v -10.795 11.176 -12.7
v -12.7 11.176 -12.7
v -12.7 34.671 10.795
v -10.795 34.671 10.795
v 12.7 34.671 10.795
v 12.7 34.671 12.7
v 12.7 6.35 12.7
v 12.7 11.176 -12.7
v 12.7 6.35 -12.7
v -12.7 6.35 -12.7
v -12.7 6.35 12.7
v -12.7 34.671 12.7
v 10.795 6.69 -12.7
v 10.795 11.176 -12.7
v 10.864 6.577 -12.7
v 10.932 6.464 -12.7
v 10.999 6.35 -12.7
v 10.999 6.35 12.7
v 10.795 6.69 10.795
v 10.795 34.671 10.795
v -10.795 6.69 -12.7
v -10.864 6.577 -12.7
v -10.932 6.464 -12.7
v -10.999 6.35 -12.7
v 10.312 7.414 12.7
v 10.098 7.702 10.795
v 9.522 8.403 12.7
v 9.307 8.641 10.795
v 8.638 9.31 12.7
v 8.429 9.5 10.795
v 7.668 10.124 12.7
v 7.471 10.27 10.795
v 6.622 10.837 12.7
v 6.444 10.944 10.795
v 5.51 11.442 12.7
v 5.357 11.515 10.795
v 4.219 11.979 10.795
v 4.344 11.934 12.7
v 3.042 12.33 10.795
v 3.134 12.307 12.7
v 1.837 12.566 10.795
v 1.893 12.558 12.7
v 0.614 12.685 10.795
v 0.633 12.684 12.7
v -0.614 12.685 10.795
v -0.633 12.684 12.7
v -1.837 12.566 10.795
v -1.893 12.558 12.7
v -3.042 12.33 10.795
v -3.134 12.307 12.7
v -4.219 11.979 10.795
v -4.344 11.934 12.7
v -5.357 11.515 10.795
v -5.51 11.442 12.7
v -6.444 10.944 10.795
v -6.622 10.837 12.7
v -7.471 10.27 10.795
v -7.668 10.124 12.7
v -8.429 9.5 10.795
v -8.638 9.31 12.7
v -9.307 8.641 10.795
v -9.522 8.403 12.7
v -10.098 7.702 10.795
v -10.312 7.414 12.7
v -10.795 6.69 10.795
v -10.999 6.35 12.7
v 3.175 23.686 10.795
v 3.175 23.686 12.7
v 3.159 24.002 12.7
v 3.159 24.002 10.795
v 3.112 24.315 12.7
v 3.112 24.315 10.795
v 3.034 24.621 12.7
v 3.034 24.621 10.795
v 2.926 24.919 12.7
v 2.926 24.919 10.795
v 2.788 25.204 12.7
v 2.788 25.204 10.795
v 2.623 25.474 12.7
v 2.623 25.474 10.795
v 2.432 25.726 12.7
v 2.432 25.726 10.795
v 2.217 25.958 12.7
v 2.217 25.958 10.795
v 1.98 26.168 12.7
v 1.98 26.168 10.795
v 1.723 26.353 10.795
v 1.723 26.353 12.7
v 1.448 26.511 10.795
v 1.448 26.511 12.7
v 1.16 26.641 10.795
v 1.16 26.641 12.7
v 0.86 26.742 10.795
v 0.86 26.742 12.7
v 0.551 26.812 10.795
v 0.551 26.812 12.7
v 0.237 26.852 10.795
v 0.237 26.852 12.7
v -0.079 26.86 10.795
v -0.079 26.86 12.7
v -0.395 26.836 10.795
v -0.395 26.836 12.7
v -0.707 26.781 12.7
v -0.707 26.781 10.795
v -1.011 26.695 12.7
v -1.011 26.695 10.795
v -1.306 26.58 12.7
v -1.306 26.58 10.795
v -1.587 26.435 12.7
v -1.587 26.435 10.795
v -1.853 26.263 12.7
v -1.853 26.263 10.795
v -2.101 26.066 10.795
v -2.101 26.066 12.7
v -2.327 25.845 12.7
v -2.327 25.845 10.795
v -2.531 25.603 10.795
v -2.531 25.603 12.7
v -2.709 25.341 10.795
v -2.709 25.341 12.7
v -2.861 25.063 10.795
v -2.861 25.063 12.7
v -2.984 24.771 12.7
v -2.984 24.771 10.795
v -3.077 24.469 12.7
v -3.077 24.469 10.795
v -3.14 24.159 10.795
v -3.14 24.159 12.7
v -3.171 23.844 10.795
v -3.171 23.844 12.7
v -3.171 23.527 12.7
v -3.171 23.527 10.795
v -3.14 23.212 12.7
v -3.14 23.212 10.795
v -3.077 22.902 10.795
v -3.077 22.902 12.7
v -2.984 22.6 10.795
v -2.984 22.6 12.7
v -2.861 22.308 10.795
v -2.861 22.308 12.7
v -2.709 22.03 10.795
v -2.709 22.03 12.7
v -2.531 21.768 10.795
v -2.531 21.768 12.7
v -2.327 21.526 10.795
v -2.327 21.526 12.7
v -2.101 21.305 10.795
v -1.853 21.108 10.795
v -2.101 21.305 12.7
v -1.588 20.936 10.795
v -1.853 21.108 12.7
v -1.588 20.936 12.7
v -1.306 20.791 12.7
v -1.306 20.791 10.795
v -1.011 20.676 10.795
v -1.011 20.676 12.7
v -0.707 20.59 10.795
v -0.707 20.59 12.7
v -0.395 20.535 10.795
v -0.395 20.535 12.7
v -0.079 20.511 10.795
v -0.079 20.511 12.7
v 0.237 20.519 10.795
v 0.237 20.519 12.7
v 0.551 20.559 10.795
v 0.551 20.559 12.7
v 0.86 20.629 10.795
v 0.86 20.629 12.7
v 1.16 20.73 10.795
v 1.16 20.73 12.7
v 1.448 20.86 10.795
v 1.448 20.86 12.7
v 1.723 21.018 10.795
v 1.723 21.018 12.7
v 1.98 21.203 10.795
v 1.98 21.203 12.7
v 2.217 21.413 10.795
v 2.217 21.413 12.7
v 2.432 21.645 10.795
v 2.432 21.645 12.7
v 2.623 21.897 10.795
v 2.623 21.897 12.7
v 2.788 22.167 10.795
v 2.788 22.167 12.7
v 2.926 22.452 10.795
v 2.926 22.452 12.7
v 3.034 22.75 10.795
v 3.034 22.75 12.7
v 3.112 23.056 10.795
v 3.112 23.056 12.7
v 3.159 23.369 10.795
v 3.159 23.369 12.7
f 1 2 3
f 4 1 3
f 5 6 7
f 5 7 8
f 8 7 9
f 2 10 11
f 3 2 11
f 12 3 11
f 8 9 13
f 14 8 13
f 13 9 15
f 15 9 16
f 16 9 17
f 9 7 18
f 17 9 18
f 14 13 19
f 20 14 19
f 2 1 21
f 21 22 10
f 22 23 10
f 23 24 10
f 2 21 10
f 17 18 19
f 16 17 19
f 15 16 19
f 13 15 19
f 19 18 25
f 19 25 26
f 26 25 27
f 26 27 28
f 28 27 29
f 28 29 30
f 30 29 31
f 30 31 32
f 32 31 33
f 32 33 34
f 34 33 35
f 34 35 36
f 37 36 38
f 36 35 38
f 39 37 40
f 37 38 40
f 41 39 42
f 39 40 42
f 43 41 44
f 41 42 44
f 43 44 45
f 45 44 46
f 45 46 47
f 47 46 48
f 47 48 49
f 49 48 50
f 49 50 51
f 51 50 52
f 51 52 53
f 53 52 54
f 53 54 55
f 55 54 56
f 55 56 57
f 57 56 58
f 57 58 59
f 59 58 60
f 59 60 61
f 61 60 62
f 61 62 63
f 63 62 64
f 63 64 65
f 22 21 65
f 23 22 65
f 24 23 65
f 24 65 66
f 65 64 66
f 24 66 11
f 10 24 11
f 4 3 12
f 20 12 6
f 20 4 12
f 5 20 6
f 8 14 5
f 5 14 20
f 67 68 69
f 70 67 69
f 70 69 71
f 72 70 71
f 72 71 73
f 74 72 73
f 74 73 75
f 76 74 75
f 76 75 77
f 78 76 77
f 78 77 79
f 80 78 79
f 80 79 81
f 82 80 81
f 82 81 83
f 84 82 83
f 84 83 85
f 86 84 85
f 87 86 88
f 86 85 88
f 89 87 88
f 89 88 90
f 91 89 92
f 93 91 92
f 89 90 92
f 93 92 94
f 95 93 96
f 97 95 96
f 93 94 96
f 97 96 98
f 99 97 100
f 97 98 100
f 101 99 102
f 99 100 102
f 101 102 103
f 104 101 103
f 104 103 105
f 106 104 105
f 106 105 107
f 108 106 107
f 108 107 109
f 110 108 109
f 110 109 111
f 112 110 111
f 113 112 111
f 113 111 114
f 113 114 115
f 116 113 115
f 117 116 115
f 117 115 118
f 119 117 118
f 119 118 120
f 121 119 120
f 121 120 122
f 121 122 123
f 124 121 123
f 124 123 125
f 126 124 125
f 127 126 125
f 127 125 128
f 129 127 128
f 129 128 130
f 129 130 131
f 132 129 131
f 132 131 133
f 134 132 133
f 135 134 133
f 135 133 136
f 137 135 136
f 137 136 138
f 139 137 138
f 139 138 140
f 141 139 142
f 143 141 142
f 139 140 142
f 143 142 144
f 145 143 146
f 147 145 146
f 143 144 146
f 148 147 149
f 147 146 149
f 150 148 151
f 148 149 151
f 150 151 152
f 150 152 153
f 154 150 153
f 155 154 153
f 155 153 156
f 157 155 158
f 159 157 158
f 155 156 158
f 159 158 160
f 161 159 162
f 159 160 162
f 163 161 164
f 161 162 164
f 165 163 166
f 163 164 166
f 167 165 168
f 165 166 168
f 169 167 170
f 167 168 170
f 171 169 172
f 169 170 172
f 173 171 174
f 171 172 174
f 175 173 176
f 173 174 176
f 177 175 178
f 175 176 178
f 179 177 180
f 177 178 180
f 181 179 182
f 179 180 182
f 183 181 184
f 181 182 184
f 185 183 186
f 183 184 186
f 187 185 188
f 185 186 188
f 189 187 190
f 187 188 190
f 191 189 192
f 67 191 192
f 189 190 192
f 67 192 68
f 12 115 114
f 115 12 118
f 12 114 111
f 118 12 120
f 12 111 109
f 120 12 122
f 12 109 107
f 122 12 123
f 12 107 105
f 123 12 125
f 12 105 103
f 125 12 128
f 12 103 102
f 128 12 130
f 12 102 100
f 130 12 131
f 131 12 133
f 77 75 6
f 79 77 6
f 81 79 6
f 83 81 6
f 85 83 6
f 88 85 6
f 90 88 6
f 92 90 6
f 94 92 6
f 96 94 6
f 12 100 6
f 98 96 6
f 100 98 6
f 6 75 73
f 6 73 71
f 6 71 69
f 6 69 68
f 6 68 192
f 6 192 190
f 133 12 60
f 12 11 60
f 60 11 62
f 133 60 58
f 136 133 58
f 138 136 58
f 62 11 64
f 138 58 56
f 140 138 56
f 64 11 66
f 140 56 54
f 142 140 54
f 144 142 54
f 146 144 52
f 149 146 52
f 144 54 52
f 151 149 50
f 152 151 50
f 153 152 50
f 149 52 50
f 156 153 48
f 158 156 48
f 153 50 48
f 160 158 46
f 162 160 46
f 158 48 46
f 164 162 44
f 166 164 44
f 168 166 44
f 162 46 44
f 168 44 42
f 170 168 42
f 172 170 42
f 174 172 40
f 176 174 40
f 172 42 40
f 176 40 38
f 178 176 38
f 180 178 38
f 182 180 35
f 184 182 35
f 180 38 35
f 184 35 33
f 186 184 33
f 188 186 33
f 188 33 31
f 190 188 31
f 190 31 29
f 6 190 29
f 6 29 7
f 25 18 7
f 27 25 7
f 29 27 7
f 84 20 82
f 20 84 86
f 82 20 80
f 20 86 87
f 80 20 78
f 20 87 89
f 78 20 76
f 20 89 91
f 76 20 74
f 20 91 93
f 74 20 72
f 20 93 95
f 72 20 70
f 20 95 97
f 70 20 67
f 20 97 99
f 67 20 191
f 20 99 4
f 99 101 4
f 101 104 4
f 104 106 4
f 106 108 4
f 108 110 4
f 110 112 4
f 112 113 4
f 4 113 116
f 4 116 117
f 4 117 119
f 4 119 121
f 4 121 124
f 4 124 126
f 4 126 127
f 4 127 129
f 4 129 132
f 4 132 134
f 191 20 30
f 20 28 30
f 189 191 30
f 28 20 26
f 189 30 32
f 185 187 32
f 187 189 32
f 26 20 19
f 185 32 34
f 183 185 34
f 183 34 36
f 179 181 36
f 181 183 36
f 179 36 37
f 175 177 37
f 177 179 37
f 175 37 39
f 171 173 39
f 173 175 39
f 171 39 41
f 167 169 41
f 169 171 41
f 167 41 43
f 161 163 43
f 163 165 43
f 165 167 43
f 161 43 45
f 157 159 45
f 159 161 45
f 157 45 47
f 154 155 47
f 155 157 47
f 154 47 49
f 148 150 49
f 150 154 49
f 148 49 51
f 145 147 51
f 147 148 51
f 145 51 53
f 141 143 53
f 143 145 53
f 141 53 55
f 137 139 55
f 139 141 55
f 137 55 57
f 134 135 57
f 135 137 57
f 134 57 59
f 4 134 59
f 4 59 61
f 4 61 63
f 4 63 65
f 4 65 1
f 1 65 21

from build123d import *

# Parameters (mm, degrees)
BOSS_EXTRUDE1_DEPTH = 34.671
CUT_EXTRUDE1_DEPTH  = 45.816606755
SKETCH3_R           = 3.175
CUT_EXTRUDE2_DEPTH  = 45.816606755
CUT_EXTRUDE3_DEPTH  = 45.816606755


with BuildPart() as part:
    # Sketch1 → Boss-Extrude1 (new body)
    with BuildSketch(Plane(origin=(0, 0, 0), x_dir=(1, 0, 0), z_dir=(0, 1, 0))):
        Polygon((-12.7, 12.7), (-12.7, -12.7), (12.7, -12.7), (12.7, 12.7), (10.795, 12.7), (10.795, -10.795), (-10.795, -10.795), (-10.795, 12.7), align=None)
    extrude(amount=BOSS_EXTRUDE1_DEPTH)

    # Sketch2 → Cut-Extrude1 (cut, through all)
    with BuildSketch(Plane.ZY.offset(12.7)):
        Polygon((-12.7, 11.176), (10.795, 34.671), (-12.7, 34.671), align=None)
    extrude(amount=-CUT_EXTRUDE1_DEPTH, mode=Mode.SUBTRACT)

    # Sketch3 → Cut-Extrude2 (cut, through all)
    with BuildSketch(Plane.XY.offset(12.7)):
        with Locations((0, 23.6855)):
            Circle(SKETCH3_R)
    extrude(amount=-CUT_EXTRUDE2_DEPTH, mode=Mode.SUBTRACT)

    # Sketch4 → Cut-Extrude3 (cut, through all)
    with BuildSketch(Plane.XY.offset(12.7)):
        with BuildLine():
            Line((-12.7, 0), (12.7, 0))
            Line((12.7, 0), (12.7, 6.35))
            Line((12.7, 6.35), (10.998522628, 6.35))
            ThreePointArc((10.998522628, 6.35), (0, 12.7), (-10.998522628, 6.35))
            Line((-10.998522628, 6.35), (-12.7, 6.35))
            Line((-12.7, 6.35), (-12.7, 0))
        make_face()
    extrude(amount=-CUT_EXTRUDE3_DEPTH, mode=Mode.SUBTRACT)


solid = part.part
